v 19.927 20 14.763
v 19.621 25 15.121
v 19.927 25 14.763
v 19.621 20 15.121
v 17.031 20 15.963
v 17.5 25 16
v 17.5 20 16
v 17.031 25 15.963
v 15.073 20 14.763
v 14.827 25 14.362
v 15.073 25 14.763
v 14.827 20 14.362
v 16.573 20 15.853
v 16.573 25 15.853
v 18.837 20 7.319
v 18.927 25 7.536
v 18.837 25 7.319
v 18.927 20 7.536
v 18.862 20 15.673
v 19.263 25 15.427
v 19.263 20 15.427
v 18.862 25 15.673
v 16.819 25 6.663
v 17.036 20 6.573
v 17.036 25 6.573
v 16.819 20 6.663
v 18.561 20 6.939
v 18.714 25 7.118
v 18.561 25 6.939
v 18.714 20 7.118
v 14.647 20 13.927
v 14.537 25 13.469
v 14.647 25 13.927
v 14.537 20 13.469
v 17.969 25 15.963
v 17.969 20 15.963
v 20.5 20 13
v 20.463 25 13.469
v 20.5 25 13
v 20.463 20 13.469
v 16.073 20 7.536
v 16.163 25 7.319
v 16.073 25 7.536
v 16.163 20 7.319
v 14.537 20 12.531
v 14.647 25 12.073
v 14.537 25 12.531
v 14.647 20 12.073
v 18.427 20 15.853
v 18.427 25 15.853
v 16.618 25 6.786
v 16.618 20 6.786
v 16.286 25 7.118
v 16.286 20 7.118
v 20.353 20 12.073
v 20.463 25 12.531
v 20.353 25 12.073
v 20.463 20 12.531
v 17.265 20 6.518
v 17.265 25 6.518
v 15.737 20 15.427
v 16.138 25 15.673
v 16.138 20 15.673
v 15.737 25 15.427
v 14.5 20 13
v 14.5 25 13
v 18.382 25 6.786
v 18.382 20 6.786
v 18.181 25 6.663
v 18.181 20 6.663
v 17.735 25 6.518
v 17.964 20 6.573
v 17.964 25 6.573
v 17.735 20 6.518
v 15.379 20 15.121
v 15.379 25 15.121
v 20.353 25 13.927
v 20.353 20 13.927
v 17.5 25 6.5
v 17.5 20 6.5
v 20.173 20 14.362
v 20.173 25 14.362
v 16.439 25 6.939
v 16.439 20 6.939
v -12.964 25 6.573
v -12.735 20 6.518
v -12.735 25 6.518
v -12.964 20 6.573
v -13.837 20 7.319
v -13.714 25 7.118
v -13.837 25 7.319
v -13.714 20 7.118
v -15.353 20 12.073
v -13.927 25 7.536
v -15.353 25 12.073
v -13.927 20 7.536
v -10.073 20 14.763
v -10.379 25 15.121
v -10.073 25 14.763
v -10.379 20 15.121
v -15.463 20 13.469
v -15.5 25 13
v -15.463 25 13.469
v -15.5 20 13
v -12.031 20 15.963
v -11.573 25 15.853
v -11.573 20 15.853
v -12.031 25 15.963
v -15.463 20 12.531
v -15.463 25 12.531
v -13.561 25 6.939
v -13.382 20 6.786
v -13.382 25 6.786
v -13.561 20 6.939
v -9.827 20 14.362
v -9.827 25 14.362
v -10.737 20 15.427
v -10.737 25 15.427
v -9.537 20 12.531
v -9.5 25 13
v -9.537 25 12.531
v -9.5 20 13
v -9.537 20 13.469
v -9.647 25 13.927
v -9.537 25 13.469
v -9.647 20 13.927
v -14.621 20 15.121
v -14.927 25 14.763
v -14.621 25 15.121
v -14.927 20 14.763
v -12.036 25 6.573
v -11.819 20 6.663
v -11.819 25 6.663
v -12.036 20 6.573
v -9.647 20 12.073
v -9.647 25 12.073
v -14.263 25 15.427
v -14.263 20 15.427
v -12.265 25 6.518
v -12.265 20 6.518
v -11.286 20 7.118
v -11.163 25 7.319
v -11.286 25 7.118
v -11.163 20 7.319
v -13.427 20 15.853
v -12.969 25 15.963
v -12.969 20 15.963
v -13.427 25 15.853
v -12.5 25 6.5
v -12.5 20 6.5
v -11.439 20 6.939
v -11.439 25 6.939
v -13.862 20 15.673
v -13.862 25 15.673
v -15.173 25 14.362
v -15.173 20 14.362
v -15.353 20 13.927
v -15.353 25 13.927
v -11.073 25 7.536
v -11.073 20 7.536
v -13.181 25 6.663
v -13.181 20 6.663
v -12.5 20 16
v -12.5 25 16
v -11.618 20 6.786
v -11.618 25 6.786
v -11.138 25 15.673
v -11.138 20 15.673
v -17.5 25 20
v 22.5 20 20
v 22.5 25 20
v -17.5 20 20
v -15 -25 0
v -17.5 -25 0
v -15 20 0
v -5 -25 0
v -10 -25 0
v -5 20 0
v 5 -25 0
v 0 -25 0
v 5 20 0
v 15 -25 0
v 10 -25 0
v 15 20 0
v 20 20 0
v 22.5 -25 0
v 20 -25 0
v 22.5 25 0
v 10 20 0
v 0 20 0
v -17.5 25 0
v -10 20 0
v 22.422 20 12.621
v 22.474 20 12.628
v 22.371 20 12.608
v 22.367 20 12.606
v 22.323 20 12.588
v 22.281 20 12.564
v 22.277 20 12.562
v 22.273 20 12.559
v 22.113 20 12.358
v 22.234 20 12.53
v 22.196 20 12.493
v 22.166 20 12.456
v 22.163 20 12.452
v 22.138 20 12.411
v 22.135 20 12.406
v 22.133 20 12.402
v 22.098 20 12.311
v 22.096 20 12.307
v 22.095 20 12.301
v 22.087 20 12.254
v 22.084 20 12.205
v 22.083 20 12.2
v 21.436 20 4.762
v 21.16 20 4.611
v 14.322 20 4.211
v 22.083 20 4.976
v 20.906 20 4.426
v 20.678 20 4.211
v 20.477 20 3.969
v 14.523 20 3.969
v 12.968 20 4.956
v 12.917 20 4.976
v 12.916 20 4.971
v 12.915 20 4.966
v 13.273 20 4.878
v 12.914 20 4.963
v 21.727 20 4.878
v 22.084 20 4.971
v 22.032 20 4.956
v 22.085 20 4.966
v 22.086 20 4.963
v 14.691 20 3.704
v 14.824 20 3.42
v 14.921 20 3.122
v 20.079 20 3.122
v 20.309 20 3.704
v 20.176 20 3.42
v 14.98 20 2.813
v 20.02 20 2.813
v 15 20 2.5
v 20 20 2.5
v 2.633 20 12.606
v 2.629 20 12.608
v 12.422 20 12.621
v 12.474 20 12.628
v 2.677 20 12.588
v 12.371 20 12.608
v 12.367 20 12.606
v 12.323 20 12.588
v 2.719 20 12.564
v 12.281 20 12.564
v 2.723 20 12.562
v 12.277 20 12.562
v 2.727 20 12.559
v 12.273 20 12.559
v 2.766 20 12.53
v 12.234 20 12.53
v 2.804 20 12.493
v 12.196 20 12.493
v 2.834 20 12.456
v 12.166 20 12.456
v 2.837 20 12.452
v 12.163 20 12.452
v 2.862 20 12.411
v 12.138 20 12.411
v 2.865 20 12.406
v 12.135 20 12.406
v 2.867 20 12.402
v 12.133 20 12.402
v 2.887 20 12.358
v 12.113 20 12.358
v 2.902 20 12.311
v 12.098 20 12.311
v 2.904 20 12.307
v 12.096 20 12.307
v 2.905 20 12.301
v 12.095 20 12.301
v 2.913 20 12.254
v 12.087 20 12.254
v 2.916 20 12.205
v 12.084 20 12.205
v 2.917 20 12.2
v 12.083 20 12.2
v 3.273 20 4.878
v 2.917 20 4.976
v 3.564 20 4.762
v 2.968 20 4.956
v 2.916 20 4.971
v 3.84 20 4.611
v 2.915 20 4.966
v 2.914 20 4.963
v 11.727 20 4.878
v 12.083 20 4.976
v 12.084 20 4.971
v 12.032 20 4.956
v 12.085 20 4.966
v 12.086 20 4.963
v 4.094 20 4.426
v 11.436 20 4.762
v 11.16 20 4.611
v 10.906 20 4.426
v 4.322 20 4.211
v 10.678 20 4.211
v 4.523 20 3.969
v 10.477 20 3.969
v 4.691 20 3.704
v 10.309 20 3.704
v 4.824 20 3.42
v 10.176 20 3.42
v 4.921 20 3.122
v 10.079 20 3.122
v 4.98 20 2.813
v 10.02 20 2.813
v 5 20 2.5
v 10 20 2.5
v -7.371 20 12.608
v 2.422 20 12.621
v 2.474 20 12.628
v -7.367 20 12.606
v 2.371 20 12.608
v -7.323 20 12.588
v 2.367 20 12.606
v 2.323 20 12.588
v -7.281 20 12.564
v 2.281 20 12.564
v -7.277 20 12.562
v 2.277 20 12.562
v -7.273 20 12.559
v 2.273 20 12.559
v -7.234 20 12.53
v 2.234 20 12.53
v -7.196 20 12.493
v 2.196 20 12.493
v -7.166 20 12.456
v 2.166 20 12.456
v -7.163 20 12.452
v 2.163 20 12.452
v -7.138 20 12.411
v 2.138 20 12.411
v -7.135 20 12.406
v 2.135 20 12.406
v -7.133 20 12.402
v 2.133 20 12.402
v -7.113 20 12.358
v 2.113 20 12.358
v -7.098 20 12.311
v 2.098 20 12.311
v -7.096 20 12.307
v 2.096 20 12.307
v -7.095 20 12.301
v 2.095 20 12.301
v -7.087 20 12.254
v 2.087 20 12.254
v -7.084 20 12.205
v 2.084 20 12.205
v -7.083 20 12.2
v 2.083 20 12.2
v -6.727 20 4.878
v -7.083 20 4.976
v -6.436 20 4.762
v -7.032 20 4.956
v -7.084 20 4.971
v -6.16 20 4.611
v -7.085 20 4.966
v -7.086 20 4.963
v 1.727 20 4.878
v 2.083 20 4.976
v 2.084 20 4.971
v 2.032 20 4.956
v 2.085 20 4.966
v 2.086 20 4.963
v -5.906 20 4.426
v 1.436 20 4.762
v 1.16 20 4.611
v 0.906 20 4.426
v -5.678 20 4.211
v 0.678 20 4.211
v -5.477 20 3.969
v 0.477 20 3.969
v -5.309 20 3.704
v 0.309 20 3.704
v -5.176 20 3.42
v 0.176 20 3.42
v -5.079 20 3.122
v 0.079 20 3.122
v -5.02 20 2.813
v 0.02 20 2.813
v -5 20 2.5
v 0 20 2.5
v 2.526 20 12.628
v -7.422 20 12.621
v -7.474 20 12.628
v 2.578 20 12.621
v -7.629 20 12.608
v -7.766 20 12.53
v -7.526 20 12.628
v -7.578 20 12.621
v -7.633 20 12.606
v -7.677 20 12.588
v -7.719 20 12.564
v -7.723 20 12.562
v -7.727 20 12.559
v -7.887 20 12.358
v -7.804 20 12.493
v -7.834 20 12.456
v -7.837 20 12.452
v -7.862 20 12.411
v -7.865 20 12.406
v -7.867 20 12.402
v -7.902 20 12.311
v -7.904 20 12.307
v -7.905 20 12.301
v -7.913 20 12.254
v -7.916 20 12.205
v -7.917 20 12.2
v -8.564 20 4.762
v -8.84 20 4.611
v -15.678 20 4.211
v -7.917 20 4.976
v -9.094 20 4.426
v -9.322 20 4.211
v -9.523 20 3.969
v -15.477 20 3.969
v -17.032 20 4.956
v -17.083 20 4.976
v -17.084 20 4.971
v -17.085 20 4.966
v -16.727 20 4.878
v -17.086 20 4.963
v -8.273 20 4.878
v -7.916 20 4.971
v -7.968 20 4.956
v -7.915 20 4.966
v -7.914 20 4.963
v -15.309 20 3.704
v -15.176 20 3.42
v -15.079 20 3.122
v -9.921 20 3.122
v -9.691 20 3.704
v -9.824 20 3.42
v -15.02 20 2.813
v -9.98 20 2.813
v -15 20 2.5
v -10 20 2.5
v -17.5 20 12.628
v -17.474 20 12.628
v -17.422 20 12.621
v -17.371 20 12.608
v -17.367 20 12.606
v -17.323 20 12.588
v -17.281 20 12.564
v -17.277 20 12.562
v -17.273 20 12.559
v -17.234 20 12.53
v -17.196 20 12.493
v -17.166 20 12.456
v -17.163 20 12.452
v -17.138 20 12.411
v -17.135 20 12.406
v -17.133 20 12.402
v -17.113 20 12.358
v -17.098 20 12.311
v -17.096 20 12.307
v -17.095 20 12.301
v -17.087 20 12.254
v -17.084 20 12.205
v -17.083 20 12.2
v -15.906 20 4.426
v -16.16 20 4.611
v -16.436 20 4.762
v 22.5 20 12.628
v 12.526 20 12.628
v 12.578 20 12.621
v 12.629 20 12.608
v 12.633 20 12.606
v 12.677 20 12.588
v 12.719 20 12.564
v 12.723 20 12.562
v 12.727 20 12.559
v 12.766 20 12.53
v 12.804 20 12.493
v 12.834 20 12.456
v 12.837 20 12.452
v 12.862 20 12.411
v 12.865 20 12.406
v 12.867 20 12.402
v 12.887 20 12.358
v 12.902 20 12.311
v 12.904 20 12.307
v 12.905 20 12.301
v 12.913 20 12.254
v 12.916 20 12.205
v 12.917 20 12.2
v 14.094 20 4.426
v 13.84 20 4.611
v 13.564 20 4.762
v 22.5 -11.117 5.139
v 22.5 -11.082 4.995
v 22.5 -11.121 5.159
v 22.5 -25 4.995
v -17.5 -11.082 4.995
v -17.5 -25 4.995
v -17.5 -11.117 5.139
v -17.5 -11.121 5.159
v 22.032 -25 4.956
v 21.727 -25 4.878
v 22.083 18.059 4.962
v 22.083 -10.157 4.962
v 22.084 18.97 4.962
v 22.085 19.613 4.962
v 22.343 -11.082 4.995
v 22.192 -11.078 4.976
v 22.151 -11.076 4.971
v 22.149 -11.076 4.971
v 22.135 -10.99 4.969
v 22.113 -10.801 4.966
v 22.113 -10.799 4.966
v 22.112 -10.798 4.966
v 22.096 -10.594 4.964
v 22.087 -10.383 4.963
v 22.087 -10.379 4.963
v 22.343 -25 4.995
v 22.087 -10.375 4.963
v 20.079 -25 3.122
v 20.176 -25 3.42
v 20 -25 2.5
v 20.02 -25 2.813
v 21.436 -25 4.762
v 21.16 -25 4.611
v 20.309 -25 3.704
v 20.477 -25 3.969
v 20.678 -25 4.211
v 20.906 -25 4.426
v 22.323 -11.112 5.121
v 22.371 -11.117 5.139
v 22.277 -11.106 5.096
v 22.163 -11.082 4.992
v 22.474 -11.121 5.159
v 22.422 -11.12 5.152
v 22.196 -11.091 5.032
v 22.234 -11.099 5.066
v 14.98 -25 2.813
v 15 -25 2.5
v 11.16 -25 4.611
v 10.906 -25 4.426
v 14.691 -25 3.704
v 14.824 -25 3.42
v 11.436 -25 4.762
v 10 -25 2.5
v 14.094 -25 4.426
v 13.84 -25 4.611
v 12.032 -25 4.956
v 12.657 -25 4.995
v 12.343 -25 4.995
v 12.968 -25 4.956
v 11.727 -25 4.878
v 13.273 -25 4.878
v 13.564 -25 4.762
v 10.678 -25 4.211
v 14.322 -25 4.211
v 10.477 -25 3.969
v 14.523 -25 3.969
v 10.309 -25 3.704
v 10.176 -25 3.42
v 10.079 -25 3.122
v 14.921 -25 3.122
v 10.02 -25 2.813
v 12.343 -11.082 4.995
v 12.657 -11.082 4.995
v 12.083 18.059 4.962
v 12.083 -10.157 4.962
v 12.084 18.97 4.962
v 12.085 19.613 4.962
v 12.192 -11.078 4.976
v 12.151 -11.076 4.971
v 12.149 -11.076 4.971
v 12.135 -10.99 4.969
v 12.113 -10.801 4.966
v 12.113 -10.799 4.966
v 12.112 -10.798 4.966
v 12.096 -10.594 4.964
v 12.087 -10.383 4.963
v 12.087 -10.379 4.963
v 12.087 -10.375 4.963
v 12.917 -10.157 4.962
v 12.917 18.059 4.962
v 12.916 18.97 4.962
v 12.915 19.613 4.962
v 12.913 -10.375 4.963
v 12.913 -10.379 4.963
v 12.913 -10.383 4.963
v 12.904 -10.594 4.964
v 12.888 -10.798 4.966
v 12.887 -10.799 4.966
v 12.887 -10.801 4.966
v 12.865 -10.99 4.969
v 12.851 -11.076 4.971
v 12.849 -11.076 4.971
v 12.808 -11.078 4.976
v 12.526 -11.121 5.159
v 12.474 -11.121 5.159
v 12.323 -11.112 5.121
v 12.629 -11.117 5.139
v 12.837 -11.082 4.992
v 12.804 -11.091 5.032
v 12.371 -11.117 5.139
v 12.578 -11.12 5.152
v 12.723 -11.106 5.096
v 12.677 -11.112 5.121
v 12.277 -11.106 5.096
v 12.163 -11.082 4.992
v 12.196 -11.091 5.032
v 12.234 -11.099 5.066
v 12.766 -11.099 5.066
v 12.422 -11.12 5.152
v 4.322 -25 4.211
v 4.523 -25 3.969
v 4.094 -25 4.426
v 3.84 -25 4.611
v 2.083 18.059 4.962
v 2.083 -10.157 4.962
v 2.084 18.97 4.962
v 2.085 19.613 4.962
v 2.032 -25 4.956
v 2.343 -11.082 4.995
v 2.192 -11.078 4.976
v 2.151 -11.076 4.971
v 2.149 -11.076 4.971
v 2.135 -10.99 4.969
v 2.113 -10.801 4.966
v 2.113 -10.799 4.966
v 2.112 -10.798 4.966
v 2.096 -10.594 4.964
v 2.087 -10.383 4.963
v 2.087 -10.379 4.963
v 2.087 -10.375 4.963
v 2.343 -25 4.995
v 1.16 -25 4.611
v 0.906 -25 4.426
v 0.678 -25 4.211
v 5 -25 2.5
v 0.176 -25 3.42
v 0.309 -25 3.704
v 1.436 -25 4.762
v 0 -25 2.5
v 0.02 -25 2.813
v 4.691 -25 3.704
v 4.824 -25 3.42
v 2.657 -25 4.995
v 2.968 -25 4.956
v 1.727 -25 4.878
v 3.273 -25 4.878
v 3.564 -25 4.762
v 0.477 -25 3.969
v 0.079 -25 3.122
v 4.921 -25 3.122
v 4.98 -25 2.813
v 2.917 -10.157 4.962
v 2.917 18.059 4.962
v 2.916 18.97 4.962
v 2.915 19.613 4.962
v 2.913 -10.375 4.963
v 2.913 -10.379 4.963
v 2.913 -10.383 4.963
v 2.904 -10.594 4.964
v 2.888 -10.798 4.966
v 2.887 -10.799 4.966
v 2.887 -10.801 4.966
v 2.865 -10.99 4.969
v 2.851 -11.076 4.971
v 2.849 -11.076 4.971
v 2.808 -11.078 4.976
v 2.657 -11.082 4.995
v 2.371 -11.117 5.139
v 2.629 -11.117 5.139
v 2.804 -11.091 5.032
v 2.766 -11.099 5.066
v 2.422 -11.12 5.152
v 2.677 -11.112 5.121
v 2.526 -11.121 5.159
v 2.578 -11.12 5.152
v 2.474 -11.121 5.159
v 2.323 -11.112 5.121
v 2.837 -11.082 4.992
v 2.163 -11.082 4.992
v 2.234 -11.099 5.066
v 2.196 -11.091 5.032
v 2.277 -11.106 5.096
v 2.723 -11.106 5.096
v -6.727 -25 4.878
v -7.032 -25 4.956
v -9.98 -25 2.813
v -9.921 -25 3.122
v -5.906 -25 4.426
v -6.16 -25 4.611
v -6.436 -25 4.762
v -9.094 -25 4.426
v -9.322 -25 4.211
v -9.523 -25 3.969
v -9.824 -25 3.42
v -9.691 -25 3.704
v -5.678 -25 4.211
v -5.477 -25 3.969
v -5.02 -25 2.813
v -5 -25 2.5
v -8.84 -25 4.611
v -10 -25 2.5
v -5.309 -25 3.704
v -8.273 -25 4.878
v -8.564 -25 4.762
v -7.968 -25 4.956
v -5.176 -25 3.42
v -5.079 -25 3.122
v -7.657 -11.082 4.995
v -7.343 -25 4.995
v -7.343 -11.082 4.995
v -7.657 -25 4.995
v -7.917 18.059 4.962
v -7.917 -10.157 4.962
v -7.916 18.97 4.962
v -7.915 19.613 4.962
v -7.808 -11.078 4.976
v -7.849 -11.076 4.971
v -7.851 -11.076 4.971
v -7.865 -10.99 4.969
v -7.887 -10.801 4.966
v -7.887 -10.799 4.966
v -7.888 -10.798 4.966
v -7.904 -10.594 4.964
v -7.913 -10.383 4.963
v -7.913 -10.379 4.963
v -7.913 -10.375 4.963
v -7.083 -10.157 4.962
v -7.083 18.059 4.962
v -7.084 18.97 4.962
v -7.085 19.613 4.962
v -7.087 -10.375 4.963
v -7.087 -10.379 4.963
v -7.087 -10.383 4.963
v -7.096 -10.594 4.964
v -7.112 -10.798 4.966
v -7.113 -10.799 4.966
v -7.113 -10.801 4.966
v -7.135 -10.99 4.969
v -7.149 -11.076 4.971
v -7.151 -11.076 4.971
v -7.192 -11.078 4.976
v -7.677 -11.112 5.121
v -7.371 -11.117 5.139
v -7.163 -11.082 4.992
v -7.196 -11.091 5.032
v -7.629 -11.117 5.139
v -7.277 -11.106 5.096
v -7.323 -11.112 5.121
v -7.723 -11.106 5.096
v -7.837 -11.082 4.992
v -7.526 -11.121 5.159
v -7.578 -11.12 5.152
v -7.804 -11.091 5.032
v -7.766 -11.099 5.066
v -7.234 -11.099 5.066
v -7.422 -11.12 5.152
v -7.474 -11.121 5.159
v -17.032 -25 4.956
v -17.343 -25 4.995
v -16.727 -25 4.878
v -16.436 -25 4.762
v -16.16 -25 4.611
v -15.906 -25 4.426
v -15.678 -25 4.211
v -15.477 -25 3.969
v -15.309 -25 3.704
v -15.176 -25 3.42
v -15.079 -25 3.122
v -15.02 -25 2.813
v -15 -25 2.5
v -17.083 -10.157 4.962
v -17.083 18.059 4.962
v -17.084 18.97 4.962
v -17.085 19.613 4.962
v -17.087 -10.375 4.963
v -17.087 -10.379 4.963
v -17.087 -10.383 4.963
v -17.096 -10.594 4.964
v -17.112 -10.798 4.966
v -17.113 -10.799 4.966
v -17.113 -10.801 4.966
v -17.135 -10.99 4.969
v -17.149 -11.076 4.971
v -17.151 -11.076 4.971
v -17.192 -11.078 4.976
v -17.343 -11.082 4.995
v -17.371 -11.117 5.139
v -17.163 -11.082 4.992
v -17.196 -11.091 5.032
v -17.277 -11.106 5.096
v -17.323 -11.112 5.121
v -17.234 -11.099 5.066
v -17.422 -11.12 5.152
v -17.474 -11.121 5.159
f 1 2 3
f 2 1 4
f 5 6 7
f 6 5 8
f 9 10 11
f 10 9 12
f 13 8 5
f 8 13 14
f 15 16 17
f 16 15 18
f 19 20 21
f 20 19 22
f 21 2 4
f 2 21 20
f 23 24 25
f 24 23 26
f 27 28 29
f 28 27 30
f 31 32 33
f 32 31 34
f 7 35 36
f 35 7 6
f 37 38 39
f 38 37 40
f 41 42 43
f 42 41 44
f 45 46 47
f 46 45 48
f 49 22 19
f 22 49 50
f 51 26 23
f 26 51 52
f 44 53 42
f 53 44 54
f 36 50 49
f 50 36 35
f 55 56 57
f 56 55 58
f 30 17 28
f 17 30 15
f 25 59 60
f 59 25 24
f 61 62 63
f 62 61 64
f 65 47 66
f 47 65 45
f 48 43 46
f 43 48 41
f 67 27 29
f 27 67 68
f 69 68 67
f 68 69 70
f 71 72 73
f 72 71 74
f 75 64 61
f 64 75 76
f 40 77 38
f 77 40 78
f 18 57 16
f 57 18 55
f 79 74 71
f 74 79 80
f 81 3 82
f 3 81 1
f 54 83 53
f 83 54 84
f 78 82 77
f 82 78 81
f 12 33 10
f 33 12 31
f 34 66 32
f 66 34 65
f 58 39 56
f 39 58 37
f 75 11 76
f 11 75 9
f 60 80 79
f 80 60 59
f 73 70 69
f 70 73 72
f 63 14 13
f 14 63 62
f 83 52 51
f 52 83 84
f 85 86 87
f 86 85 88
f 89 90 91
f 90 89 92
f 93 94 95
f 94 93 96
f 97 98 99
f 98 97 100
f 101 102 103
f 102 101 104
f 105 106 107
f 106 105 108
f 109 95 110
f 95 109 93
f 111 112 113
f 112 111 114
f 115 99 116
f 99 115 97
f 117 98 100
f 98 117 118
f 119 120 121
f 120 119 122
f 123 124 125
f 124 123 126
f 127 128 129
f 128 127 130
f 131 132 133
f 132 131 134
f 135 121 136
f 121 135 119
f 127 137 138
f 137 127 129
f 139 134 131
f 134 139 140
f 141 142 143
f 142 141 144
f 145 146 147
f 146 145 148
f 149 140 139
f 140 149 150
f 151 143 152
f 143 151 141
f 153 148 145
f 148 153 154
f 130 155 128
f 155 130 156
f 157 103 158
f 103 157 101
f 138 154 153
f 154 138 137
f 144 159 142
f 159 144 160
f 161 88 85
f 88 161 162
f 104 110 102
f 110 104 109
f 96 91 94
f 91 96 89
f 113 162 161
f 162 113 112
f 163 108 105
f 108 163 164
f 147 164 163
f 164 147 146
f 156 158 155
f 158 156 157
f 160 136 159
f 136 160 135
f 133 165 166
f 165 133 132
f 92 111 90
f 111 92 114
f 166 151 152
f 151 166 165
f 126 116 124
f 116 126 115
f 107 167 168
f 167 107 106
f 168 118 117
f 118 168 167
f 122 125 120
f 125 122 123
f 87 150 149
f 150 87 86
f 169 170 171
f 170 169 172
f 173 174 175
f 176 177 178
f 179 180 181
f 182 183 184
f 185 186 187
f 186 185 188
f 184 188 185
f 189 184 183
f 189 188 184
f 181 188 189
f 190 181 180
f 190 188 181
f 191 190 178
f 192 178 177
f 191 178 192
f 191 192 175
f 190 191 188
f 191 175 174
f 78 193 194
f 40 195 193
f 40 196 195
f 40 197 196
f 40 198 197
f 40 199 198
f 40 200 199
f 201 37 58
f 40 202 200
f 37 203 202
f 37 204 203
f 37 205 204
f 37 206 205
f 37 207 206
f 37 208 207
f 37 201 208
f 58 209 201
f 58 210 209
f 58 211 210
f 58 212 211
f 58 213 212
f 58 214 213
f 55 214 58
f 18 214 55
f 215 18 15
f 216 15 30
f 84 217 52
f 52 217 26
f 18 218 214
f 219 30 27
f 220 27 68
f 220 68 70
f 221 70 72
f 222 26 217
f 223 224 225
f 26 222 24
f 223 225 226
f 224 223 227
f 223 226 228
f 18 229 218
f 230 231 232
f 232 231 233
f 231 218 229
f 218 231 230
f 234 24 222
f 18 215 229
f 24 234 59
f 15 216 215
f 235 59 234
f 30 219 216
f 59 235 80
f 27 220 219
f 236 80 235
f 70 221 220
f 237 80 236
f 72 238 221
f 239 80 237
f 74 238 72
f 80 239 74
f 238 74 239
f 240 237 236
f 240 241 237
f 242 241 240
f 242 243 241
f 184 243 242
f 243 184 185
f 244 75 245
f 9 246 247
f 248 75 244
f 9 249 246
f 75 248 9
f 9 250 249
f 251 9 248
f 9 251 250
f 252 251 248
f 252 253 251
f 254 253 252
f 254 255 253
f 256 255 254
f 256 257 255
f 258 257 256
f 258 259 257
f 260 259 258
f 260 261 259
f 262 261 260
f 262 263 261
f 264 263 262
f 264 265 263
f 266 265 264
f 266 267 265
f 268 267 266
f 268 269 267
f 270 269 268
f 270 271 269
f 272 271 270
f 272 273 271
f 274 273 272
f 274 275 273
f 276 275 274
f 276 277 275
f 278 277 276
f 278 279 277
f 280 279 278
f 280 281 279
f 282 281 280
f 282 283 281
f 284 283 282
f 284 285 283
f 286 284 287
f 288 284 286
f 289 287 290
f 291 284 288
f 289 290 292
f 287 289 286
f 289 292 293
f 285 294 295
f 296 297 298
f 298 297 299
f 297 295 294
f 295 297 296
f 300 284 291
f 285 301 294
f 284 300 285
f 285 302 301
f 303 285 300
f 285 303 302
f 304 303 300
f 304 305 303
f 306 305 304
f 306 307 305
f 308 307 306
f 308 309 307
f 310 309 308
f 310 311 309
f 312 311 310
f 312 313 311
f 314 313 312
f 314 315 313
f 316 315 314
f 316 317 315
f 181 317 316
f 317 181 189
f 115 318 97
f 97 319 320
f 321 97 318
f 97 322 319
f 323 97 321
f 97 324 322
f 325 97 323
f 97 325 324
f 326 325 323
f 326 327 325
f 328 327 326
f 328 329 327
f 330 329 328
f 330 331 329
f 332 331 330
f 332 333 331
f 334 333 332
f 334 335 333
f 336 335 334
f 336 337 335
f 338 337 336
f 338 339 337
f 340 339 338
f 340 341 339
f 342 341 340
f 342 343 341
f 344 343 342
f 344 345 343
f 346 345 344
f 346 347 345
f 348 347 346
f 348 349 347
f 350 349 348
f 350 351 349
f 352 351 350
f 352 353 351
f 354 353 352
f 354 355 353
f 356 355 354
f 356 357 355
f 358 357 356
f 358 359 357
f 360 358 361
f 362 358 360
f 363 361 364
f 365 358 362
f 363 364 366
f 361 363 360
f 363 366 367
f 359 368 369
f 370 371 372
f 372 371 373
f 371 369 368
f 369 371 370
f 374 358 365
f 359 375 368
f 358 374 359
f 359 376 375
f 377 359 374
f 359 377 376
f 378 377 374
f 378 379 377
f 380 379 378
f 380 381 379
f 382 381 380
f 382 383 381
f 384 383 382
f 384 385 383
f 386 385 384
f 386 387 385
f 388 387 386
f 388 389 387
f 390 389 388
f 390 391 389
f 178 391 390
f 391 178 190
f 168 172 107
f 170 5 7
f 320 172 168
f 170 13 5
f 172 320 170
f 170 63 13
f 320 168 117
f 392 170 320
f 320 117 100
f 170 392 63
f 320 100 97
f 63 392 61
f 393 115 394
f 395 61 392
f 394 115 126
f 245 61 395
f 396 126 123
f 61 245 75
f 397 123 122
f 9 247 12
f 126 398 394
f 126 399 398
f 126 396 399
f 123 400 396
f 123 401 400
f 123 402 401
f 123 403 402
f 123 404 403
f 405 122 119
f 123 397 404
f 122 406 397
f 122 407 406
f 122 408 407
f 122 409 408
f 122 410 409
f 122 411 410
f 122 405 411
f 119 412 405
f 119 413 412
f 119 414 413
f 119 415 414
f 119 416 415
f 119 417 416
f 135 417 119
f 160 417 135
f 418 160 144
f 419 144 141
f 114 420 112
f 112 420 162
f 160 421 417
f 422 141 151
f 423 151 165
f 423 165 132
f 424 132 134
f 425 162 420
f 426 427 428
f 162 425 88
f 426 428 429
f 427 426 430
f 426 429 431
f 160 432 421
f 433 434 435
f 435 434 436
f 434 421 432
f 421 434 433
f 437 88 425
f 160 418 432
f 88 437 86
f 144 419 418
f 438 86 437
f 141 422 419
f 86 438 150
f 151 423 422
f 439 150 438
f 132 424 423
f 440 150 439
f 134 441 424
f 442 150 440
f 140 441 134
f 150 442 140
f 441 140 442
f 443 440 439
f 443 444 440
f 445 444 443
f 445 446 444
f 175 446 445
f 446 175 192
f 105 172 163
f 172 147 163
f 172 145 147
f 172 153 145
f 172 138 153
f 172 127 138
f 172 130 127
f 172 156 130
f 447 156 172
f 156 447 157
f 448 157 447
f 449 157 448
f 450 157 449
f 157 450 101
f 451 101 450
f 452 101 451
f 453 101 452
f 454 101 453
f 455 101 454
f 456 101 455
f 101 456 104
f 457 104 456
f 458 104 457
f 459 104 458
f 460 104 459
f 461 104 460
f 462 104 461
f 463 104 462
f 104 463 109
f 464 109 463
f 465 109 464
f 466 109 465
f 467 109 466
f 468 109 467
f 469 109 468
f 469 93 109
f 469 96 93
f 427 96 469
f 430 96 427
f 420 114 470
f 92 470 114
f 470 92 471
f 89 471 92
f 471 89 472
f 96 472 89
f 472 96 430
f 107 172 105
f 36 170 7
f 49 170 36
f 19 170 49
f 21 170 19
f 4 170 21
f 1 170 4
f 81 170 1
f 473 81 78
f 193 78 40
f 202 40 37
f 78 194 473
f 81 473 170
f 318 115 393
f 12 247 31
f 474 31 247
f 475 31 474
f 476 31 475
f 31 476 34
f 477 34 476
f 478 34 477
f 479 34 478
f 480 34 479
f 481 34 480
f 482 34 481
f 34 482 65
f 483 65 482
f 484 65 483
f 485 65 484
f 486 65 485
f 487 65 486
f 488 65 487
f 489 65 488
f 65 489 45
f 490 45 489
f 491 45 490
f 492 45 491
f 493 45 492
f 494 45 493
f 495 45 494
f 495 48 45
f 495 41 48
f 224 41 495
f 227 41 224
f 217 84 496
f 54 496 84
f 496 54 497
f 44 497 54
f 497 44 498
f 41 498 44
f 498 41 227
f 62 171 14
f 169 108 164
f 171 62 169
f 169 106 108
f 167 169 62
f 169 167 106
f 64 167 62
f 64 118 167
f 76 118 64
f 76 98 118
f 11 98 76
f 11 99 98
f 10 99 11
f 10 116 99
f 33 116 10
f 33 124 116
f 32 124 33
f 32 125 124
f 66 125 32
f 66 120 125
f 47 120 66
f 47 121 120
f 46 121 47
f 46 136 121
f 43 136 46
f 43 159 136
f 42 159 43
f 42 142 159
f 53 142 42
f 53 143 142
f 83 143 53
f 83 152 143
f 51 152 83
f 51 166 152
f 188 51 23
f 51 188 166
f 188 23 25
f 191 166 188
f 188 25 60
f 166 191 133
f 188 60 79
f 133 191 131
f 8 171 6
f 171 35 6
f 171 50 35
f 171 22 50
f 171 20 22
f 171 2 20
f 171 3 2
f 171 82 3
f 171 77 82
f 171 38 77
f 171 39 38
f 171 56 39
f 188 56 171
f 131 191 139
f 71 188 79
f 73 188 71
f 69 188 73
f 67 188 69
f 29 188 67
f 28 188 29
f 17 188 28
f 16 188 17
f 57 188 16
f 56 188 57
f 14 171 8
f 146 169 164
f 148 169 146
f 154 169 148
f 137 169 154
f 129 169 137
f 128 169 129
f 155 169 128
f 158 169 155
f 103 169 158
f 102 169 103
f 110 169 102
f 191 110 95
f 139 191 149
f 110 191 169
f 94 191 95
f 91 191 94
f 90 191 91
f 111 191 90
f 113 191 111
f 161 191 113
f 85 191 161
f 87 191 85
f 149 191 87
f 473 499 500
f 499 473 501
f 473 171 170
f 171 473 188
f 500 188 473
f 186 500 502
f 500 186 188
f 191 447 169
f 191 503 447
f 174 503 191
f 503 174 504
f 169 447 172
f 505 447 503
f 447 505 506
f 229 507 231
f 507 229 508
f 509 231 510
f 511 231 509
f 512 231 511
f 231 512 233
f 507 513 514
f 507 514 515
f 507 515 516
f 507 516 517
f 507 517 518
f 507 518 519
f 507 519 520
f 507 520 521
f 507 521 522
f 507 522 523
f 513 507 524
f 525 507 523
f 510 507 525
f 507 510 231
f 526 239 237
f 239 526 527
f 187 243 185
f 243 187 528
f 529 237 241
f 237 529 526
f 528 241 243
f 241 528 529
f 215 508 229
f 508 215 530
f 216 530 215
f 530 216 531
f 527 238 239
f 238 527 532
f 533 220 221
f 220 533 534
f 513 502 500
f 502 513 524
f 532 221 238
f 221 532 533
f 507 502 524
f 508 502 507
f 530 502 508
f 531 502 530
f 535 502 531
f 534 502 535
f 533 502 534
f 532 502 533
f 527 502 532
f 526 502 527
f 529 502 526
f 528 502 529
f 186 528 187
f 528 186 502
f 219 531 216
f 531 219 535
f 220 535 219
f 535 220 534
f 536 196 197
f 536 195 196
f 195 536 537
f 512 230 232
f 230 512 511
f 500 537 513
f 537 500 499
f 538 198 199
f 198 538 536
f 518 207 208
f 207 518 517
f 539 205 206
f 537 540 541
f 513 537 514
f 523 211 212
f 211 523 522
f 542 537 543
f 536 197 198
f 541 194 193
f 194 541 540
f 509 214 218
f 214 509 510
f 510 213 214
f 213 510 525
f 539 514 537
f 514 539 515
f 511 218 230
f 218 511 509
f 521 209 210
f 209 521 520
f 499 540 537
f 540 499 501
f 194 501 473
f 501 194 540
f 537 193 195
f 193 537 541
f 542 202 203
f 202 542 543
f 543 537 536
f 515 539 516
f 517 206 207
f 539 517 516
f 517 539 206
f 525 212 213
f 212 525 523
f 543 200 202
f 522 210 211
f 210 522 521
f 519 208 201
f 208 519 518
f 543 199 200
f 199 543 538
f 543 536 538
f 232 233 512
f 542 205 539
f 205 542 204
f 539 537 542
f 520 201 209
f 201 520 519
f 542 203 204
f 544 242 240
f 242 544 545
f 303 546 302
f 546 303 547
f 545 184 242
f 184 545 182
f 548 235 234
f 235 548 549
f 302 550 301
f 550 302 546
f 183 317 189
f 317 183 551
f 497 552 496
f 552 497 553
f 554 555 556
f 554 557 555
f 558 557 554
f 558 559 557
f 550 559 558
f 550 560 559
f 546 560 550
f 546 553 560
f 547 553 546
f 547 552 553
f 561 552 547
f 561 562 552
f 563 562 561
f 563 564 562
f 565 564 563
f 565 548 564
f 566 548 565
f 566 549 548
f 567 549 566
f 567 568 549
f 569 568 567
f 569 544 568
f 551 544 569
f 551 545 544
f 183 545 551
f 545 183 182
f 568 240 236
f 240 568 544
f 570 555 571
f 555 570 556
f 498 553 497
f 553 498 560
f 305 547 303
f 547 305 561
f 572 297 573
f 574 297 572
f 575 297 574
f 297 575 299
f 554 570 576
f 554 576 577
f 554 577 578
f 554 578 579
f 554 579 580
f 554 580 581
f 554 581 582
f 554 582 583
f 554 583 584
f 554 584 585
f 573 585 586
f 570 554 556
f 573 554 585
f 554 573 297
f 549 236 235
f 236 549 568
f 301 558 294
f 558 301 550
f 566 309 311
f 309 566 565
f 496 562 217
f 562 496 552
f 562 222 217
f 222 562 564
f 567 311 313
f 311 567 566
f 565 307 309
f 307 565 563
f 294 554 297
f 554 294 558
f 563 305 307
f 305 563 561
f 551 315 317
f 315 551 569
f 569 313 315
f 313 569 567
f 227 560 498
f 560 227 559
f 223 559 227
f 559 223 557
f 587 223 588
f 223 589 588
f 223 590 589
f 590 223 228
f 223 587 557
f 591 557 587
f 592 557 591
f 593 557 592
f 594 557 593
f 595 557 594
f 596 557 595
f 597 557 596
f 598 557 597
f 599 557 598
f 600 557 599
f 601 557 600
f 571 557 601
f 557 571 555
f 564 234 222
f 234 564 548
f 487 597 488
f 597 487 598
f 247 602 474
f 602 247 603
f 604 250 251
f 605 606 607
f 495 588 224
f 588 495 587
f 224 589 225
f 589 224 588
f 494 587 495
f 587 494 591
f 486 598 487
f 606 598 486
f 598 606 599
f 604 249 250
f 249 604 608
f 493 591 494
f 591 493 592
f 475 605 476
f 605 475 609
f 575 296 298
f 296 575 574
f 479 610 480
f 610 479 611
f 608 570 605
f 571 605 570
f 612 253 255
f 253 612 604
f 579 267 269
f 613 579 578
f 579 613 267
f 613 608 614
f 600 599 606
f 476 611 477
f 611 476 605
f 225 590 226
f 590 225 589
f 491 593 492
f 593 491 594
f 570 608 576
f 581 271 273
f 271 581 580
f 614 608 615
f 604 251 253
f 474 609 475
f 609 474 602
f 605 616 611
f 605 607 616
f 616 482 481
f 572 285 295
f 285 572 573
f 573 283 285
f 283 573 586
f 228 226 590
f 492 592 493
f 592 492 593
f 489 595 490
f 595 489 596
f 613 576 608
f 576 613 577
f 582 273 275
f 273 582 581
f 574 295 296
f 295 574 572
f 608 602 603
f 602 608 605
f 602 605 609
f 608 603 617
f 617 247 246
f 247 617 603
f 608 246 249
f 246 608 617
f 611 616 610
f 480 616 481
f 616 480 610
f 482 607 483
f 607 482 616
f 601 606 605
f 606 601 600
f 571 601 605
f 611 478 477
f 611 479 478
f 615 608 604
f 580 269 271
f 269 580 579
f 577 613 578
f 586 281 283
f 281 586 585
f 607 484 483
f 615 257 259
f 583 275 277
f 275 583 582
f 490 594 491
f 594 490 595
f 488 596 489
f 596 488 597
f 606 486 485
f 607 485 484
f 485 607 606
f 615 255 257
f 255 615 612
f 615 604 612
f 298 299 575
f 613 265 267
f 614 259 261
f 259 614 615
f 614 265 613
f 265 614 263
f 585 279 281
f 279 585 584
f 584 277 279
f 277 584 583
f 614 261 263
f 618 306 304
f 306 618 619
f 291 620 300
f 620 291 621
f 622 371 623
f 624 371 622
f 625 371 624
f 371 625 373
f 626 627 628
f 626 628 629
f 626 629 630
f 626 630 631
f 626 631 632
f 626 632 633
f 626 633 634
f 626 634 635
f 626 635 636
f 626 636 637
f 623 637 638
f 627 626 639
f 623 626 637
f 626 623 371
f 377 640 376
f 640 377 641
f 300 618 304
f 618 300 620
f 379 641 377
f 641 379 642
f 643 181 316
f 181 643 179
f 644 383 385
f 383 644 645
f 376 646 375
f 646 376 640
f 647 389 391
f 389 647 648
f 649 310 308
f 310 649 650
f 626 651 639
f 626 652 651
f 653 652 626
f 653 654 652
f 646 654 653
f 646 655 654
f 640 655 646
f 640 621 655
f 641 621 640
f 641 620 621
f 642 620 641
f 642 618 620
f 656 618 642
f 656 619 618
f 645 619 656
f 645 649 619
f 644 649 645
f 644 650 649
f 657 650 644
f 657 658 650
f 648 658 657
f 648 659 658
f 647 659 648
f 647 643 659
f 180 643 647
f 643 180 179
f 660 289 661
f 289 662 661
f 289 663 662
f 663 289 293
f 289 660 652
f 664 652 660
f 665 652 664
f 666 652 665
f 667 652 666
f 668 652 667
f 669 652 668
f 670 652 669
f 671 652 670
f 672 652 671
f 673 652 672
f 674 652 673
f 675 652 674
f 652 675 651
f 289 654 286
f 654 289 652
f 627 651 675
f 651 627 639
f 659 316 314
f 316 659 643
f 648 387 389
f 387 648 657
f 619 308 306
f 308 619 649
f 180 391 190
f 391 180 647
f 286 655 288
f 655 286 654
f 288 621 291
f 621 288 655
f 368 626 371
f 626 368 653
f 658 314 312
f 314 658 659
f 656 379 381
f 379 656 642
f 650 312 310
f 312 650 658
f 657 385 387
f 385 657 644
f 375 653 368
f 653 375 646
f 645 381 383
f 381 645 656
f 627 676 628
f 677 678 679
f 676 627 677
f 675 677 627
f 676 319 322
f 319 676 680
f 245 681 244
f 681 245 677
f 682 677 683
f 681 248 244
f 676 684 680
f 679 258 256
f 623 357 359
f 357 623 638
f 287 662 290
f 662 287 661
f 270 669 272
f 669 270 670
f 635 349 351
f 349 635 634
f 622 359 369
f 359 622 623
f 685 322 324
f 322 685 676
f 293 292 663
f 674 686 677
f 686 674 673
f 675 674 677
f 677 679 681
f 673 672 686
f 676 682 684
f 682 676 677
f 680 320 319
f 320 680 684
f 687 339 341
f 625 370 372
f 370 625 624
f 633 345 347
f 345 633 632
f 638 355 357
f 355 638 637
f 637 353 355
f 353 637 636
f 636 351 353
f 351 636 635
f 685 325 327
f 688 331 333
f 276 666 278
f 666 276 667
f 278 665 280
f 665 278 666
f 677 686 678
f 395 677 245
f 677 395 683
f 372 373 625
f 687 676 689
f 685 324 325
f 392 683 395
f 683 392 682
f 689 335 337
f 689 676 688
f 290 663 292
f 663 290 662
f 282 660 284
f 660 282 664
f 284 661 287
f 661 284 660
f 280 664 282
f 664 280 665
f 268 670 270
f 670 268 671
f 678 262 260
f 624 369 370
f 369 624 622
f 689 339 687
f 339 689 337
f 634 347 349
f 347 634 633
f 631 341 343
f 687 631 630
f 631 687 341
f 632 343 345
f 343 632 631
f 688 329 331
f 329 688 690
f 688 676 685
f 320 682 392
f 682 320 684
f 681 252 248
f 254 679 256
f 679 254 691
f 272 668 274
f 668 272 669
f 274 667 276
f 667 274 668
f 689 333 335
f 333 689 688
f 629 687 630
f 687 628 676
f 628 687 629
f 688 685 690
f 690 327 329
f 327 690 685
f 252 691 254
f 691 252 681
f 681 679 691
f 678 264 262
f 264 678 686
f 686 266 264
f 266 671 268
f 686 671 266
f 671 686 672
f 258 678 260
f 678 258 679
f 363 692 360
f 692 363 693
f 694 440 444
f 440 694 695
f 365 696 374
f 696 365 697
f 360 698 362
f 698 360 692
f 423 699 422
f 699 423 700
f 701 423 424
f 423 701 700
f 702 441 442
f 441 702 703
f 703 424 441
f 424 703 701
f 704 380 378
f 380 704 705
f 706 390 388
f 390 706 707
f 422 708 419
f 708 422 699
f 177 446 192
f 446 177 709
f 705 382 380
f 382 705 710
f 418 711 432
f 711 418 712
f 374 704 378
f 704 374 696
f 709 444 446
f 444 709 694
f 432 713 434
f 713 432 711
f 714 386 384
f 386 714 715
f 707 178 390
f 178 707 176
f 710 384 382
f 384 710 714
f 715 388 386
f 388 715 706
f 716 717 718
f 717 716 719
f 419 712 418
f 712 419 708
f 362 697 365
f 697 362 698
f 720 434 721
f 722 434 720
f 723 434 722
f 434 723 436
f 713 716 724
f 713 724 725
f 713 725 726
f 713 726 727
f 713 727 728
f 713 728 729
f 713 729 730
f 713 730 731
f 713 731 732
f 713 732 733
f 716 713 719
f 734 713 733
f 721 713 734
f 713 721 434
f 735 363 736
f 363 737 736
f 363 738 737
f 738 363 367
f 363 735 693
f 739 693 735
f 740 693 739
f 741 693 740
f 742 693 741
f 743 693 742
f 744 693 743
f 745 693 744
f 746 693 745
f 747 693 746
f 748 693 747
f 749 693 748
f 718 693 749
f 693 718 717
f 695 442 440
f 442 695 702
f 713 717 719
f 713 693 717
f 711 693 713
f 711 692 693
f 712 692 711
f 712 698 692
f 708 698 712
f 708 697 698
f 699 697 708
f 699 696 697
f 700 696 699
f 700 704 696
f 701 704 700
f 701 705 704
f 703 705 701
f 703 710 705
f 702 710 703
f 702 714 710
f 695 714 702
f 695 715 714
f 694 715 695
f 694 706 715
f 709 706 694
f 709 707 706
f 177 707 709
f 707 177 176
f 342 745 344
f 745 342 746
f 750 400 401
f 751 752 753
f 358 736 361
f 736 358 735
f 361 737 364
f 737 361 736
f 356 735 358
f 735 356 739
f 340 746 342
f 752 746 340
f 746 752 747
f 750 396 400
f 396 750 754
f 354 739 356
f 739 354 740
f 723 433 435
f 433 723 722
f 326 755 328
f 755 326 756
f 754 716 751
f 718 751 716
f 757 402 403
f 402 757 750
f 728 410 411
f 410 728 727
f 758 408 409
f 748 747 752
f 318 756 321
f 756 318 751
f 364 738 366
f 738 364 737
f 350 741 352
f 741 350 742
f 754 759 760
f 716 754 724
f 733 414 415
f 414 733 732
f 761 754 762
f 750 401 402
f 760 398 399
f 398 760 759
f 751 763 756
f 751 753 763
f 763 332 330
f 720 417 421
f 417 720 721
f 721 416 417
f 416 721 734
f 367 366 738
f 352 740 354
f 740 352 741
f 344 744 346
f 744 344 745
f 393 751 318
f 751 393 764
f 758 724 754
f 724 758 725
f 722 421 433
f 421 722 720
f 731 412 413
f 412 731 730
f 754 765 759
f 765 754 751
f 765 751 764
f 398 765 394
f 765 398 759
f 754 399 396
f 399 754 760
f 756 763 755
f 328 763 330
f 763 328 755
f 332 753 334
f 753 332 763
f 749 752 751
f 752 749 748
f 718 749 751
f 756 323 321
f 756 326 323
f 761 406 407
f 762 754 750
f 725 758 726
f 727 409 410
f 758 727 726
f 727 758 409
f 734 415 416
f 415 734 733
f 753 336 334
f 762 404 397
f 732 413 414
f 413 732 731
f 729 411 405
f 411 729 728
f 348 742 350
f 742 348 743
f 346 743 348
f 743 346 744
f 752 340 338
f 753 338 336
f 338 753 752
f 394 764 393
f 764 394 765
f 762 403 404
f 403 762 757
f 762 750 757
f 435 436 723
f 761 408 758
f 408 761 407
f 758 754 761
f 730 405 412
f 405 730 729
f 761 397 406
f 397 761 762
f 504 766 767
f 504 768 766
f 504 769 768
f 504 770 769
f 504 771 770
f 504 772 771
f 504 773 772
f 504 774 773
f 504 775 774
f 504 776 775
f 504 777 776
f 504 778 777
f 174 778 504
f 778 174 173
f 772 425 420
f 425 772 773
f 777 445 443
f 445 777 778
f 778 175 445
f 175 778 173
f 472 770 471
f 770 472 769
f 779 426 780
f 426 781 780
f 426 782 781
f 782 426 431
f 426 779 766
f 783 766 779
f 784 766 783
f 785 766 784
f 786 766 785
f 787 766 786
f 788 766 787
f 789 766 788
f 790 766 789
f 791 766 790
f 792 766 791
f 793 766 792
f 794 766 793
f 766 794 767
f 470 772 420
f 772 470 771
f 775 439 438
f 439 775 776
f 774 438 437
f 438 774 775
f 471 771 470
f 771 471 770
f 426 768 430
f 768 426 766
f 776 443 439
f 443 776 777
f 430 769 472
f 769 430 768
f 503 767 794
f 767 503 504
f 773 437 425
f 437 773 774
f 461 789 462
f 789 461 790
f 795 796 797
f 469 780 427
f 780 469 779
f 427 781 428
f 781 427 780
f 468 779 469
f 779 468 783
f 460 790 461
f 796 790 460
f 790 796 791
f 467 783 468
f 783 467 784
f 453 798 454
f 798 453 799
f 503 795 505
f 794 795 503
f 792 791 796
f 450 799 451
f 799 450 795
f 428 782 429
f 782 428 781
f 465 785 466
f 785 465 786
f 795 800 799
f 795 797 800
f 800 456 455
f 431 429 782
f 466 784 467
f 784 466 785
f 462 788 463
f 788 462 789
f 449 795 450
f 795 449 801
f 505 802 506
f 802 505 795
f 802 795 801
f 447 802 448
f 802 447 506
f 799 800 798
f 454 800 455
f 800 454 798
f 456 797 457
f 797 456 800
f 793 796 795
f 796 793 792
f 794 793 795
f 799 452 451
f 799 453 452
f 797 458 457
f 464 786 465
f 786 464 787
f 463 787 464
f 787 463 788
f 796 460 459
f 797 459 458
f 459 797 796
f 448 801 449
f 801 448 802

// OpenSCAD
/******************************************************************************/
/**********                     INFO                                 **********/
/******************************************************************************/

/*
Wall Mount Test lead Hanger Rev 1.1 March 2016
you can adjust the number of fingers, length and gap.  
The wall mount piece will auto adjust total width to accommodate the above parameters
by David Buhler

1.1
-added hole size fix for small finger gaps and large wall mount hole size
-fixed minimum finger length support cylinder length
-adjusted variable settings for customizer so user input doesn't create wierd holes and gaps
-added side trimming to reduce size and plastic use.

*/

/******************************************************************************/
/**********                     Settings                             **********/
/******************************************************************************/
//adjust the follow to meet your needs,  all measurements in mm.

/* [BACK] */
//Height of wall mounting plate
back_height=20;//[12:50]

//Mounting plate thickness
back_thickness=5;//[3:10] 

/* [FINGERS] */
//Finger slope(degrees)
back_tilt=0;//[0:8]

//Number of fingers
numberof_fingers=5;//[3:15]

//Slot length
finger_length=50;//[20:100]

//determines weight holding ability
finger_thickness=5; //[2:7]

//how much room for the clips
finger_width=5; //[5:20]

//how wide the slot will be(cable thickness)
finger_gap=5;//[1:15]

/* [SCREW-HOLES] */
//add mounting holes?
mount_holes="yes";//[yes,no]

//thread size in mm
hole_size=3;//[1:6]

/* [FINGER SHAPE] */
//select one the the two following finger shapes
finger_shape="round";//[round,square]
//Trim the sides?
trim_sides= "yes"; // [yes,no]


/* [BUILD PLATE] */
//for display only, doesn't contribute to final object
build_plate_selector = 3; //[0:Replicator 2,1: Replicator,2:Thingomatic,3:Manual]
//when Build Plate Selector is set to "manual" this controls the build plate x dimension
build_plate_manual_x = 200; //[100:400]
//when Build Plate Selector is set to "manual" this controls the build plate y dimension
build_plate_manual_y = 200; //[100:400]
build_plate(build_plate_selector,build_plate_manual_x,build_plate_manual_y);

/******************************************************************************/
/**********                   Variable Calcs                         **********/
/****placement of the finger support structure, no need to adjust these********/
/******************************************************************************/
/* [HIDDEN] */
s_width=finger_width/6; //Support triangle width  could just make a fixed width rather than based on finger width
s_height=back_height/2.5;//Support triangle height based on the back height
s_length=finger_length/3*2;//Support triangle lenght based on the finger length 
s_placement_x=(finger_width/2)-(s_width/2);//where to place the X starting point of the support 
s_placement_y=back_thickness/3; //where to place the Y starting point of the support, /3 to accommodate the back tilt 
s_placement_z=finger_thickness;//where to place the Z starting point of the support 


/******************************************************************************/
/**********                  Make It Happen Stuff                    **********/
/******************************************************************************/

echo ("Project Size (wide x height x finger length " ,numberof_fingers*(finger_width+finger_gap)," x ",back_height," x ",finger_length+back_thickness);

//centre the whole project on x0,y0
rotate ([0,0,180])translate ([-(numberof_fingers*(finger_width+finger_gap))/2,-finger_length/2,0])
    {
    difference()//had to stick three difference calls to trim sides.  weird!
        { 
       if (mount_holes=="yes")
            {
            rotate ([back_tilt,0,0]) 
                difference()
                {
                cube([(numberof_fingers*(finger_width+finger_gap))-finger_gap,back_thickness,back_height]);//make plate with auto width based on fingers+width+gap
                Holes ();
                };
            }
        else
            {
            rotate ([back_tilt,0,0]) 
                cube ([(numberof_fingers*(finger_width+finger_gap))-finger_gap,back_thickness,back_height]);//make plate with auto width based on fingers+width+gap
        }
    trim_sides();
    }
    for (inc=[0:finger_width+finger_gap:(numberof_fingers*(finger_width+finger_gap))-finger_gap]) //auto gen each finger and support placement distance
        {
        difference()//had to stick three difference calls to trim sides.  weird!
            {
        if (finger_shape=="round")
            {
            finger(inc,finger_thickness,finger_width,finger_length);//for rounded couner fingers
            }
        else if(finger_shape=="square")
            {
            translate ([inc,0,0])cube ([finger_width,finger_length,finger_thickness]);//for square fingers
            }
           trim_sides();
           }
         difference()//had to stick three difference calls to trim sides.  weird!
           {
           hull ()//created the support surface along with the rounded edge
            {
            difference ()
                {
                translate ([inc-s_width/2+finger_width/2,s_placement_y,s_placement_z])
                    cube ([s_width,s_length,s_height]);
                rotate ([-atan(s_height/s_length),0,0]) 
                    translate ([inc-.1-s_width+finger_width/2,0-back_thickness,s_height+finger_thickness-.2])
                    cube ([s_width*2,s_length*2,s_height*2]);  
                }
            translate ([inc+s_placement_x+s_width/2,s_placement_y,s_height+finger_thickness]) 
                rotate ([-atan(s_height/s_length)-90,0,0]) 
                cylinder(r=s_width/2,h=s_length+2,$fn=50); 
             }    
            trim_sides();
           }
        }
    }
    
//trims the side of the block to reduce size and unneeded support
module trim_sides()
    {
     if (trim_sides=="yes")
        {
        translate ([-finger_width/2,-5,-0.1]) 
            cube ([finger_width,finger_length+back_thickness+5,back_height+5]);
        translate ([((numberof_fingers)*(finger_width+finger_gap))-finger_gap-finger_width/2,-5,-0.1]) 
            cube ([finger_width,finger_length+back_thickness+5,back_height+5]);   
        }
     }
//creates the rounded fingers
module finger(position,thickness,width,length){
    hull(){
       rotate([-90,0,0])
            translate ([position+thickness/2,-thickness/2,0]) 
            cylinder (r=thickness/2,h=length,$fn=50);//left cylinder
       rotate([-90,0,0])
            translate ([position+width-thickness/2,-thickness/2,0]) 
            cylinder (r=thickness/2,h=length,$fn=50);//right cylinder 
       translate ([position,0,0])
            cube ([width,length,thickness/2]);//flat bottom (top when hanging)
    }
    
}
//creates the hole slots and placement based on number of fingers
module Holes ()
    {
    hole_size= hole_size*3 > back_height ? floor(back_height/5):hole_size; 
    hole_size= hole_size > finger_gap ? finger_gap:(hole_size==finger_gap ? hole_size-1:hole_size);
    if (numberof_fingers<7)
        {
        hull()
            { 
            rotate ([-90,0,0]) 
                translate([finger_width+(finger_gap/2),(-back_height/5*2)-hole_size-2,-2]) 
                cylinder(r=hole_size,h=50,$fn=40);    
            rotate ([-90,0,0]) 
                translate([finger_width+(finger_gap/2),-back_height/5*2,-2]) 
                cylinder(r=hole_size/2,h=50,$fn=40);   
            }
       hull()
            { 
            rotate ([-90,0,0]) 
                translate([((numberof_fingers-1)*(finger_width+finger_gap))-finger_gap/2,-back_height/5*2-hole_size-2,-2])        
                cylinder(r=hole_size,h=50,$fn=40);    
            rotate ([-90,0,0]) 
                translate([((numberof_fingers-1)*(finger_width+finger_gap))-finger_gap/2,-back_height/5*2,-2]) 
                cylinder(r=hole_size/2,h=50,$fn=40);   
            }
         } 
     else if (numberof_fingers>6)
        {
        hull()
            { 
            rotate ([-90,0,0]) 
                translate([(finger_width+finger_gap)*2-finger_gap/2,-back_height/5*2-hole_size-2,-2]) 
                cylinder(r=hole_size,h=50,$fn=40);    
            rotate ([-90,0,0]) 
                translate([(finger_width+finger_gap)*2-finger_gap/2,-back_height/5*2,-2]) 
                cylinder(r=hole_size/2,h=50,$fn=40);   
            }
       hull()
            { 
            rotate ([-90,0,0]) 
                translate([((numberof_fingers-2)*(finger_width+finger_gap))-finger_gap/2,-back_height/5*2-hole_size-2,-2])        
                cylinder(r=hole_size,h=50,$fn=40);    
            rotate ([-90,0,0]) 
                translate([((numberof_fingers-2)*(finger_width+finger_gap))-finger_gap/2,-back_height/5*2,-2]) 
                cylinder(r=hole_size/2,h=50,$fn=40);   
            }
         }    
     }
     
//display build plate on screen for reference 
module build_plate(bp,manX,manY){

		translate([0,0,-.52]){
			if(bp == 0){
				%cube([285,153,1],center = true);
			}
			if(bp == 1){
				%cube([225,145,1],center = true);
			}
			if(bp == 2){
				%cube([120,120,1],center = true);
			}
			if(bp == 3){
				%cube([manX,manY,1],center = true);
			}
		
		}
		translate([0,0,-.5]){
			if(bp == 0){
				for(i = [-14:14]){
					translate([i*10,0,0])
					%cube([.5,153,1.01],center = true);
				}
				for(i = [-7:7]){
					translate([0,i*10,0])
					%cube([285,.5,1.01],center = true);
				}	
			}
			if(bp == 1){
				for(i = [-11:11]){
					translate([i*10,0,0])
						%cube([.5,145,1.01],center = true);
				}
				for(i = [-7:7]){
					translate([0,i*10,0])
						%cube([225,.5,1.01],center = true);
				}
			}
			if(bp == 2){
				for(i = [-6:6]){
					translate([i*10,0,0])
						%cube([.5,120,1.01],center = true);
				}
				for(i = [-6:6]){
					translate([0,i*10,0])
						%cube([120,.5,1.01],center = true);
				}
			}
			if(bp == 3){
				for(i = [-(floor(manX/20)):floor(manX/20)]){
					translate([i*10,0,0])
						%cube([.5,manY,1.01],center = true);
				}
				for(i = [-(floor(manY/20)):floor(manY/20)]){
					translate([0,i*10,0])
						%cube([manX,.5,1.01],center = true);
				}
			}
		}
}
